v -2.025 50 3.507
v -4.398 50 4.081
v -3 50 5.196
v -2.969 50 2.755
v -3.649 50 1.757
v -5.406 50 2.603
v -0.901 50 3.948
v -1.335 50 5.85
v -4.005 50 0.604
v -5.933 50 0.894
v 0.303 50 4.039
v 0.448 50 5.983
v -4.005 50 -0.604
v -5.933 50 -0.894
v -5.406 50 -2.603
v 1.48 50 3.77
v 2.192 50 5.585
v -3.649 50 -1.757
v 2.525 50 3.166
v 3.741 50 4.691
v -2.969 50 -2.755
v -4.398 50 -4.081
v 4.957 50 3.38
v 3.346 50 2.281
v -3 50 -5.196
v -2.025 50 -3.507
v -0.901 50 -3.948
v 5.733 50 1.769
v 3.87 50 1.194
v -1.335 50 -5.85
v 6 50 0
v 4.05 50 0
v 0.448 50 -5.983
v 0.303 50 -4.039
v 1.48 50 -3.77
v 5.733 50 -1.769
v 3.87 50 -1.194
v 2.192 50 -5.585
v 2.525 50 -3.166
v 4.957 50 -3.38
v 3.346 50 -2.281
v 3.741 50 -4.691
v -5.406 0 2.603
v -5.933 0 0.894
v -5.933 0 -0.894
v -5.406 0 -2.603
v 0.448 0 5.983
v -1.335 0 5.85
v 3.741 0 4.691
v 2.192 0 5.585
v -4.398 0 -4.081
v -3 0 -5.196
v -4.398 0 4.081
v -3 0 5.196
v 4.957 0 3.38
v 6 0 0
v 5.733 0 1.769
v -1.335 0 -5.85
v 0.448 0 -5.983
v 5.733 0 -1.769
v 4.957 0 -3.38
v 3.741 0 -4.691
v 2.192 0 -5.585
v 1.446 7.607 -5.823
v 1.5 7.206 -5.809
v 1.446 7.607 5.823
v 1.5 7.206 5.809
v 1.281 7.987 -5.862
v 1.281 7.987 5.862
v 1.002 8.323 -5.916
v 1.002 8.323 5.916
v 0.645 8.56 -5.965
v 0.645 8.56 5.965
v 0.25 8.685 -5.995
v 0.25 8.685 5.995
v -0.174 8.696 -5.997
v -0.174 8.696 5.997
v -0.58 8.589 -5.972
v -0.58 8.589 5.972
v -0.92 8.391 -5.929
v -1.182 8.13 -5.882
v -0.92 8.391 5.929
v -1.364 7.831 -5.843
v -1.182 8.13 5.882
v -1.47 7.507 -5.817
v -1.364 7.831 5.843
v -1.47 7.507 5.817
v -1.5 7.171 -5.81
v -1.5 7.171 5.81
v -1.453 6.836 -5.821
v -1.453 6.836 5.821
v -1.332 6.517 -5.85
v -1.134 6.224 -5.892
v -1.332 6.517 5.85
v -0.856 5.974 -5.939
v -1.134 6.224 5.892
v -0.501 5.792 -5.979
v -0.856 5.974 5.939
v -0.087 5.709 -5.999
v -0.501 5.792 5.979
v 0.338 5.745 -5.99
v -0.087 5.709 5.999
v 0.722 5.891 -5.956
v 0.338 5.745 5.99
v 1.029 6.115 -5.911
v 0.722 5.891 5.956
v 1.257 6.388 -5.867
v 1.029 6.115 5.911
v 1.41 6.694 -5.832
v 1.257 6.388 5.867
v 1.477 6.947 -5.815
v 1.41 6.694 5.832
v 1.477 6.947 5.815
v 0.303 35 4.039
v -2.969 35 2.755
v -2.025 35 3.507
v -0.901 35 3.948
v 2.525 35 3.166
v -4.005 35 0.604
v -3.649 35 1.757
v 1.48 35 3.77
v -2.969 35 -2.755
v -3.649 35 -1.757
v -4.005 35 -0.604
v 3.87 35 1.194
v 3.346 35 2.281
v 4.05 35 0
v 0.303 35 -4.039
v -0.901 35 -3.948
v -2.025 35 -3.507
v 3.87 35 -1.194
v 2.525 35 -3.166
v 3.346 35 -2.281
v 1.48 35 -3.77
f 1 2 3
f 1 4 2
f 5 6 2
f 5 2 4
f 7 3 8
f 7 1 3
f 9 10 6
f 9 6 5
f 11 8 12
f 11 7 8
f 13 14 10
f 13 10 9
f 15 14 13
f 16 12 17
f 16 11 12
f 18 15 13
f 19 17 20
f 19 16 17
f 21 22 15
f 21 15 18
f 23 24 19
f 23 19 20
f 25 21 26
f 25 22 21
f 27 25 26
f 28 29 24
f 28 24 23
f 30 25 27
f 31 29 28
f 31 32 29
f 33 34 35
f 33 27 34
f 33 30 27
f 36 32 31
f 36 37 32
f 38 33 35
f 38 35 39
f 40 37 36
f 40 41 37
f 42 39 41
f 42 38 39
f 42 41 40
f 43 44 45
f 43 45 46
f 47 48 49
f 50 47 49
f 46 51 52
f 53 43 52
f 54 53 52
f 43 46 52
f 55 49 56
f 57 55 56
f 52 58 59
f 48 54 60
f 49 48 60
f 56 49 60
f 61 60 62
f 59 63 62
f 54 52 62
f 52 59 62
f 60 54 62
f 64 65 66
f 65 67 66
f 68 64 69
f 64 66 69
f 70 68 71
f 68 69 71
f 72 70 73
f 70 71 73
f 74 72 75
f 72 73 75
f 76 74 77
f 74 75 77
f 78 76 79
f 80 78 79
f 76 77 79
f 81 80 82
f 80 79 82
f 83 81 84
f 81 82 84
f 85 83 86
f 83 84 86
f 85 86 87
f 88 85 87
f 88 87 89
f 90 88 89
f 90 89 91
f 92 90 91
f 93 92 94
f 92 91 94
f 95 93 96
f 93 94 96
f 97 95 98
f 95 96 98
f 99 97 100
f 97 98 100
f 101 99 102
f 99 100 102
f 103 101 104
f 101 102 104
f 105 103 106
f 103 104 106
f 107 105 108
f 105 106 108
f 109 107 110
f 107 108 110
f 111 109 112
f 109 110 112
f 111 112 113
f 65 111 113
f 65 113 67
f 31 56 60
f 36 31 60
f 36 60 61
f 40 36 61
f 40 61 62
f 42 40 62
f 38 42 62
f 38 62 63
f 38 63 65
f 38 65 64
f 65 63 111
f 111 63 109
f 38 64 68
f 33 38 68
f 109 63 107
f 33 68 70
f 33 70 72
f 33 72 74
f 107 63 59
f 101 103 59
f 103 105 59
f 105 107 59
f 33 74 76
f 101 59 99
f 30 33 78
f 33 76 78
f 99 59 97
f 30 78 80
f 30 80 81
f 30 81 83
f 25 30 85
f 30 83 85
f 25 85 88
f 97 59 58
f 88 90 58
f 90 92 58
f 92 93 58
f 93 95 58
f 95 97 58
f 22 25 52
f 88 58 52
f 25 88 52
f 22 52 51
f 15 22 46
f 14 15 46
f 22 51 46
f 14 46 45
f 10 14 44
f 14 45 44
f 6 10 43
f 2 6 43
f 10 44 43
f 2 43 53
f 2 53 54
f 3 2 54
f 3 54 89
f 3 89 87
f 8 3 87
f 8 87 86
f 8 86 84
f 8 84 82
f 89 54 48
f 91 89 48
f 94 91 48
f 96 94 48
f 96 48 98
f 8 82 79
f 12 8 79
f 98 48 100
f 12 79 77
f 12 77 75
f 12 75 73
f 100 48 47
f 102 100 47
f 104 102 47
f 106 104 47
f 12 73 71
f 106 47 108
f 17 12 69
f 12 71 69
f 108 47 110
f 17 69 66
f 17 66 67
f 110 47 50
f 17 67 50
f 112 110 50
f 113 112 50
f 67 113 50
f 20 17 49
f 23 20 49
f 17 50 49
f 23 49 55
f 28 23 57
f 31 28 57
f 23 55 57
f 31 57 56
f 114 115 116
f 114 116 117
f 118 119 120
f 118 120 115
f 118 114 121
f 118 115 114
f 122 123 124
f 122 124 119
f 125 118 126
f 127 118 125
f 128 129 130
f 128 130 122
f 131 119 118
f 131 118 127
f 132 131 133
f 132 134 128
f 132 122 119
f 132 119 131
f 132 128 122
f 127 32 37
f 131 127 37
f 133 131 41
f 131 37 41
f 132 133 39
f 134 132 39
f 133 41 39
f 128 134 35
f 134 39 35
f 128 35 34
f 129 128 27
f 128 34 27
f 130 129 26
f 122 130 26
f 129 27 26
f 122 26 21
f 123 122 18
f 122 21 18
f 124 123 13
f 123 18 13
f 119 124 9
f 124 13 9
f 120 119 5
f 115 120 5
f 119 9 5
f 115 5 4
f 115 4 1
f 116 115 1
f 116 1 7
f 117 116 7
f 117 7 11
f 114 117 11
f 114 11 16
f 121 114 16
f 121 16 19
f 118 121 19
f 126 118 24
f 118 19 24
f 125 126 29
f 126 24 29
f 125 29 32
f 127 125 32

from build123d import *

# Parameters (mm, degrees)
SKETCH1_R               = 6
BOSS_EXTRUDE1_DEPTH     = 50
CUT_EXTRUDE2_START      = 50
SKETCH1_4_R             = 4.05
CUT_EXTRUDE2_DEPTH      = 15
SKETCH3_R               = 1.5
CUT_EXTRUDE3_DEPTH      = 7
CUT_EXTRUDE3_DEPTH_BACK = 7


with BuildPart() as part:
    # Sketch1 → Boss-Extrude1 (new body)
    with BuildSketch(Plane(origin=(0, 0, 0), x_dir=(1, 0, 0), z_dir=(0, 1, 0))):
        Circle(SKETCH1_R)
    extrude(amount=BOSS_EXTRUDE1_DEPTH)

    # Sketch1<4> → Cut-Extrude2 (cut)
    with BuildSketch(Plane(origin=(0, 0, 0), x_dir=(1, 0, 0), z_dir=(0, 1, 0)).offset(CUT_EXTRUDE2_START)):
        Circle(SKETCH1_4_R)
    extrude(amount=-CUT_EXTRUDE2_DEPTH, mode=Mode.SUBTRACT)

    # Sketch3 → Cut-Extrude3 (cut, two sides)
    with BuildSketch(Plane.XY) as cut_extrude3_sk:
        with Locations((0, 7.20619719)):
            Circle(SKETCH3_R)
    extrude(amount=CUT_EXTRUDE3_DEPTH, mode=Mode.SUBTRACT)
    extrude(cut_extrude3_sk.sketch, amount=-CUT_EXTRUDE3_DEPTH_BACK, mode=Mode.SUBTRACT)


solid = part.part
